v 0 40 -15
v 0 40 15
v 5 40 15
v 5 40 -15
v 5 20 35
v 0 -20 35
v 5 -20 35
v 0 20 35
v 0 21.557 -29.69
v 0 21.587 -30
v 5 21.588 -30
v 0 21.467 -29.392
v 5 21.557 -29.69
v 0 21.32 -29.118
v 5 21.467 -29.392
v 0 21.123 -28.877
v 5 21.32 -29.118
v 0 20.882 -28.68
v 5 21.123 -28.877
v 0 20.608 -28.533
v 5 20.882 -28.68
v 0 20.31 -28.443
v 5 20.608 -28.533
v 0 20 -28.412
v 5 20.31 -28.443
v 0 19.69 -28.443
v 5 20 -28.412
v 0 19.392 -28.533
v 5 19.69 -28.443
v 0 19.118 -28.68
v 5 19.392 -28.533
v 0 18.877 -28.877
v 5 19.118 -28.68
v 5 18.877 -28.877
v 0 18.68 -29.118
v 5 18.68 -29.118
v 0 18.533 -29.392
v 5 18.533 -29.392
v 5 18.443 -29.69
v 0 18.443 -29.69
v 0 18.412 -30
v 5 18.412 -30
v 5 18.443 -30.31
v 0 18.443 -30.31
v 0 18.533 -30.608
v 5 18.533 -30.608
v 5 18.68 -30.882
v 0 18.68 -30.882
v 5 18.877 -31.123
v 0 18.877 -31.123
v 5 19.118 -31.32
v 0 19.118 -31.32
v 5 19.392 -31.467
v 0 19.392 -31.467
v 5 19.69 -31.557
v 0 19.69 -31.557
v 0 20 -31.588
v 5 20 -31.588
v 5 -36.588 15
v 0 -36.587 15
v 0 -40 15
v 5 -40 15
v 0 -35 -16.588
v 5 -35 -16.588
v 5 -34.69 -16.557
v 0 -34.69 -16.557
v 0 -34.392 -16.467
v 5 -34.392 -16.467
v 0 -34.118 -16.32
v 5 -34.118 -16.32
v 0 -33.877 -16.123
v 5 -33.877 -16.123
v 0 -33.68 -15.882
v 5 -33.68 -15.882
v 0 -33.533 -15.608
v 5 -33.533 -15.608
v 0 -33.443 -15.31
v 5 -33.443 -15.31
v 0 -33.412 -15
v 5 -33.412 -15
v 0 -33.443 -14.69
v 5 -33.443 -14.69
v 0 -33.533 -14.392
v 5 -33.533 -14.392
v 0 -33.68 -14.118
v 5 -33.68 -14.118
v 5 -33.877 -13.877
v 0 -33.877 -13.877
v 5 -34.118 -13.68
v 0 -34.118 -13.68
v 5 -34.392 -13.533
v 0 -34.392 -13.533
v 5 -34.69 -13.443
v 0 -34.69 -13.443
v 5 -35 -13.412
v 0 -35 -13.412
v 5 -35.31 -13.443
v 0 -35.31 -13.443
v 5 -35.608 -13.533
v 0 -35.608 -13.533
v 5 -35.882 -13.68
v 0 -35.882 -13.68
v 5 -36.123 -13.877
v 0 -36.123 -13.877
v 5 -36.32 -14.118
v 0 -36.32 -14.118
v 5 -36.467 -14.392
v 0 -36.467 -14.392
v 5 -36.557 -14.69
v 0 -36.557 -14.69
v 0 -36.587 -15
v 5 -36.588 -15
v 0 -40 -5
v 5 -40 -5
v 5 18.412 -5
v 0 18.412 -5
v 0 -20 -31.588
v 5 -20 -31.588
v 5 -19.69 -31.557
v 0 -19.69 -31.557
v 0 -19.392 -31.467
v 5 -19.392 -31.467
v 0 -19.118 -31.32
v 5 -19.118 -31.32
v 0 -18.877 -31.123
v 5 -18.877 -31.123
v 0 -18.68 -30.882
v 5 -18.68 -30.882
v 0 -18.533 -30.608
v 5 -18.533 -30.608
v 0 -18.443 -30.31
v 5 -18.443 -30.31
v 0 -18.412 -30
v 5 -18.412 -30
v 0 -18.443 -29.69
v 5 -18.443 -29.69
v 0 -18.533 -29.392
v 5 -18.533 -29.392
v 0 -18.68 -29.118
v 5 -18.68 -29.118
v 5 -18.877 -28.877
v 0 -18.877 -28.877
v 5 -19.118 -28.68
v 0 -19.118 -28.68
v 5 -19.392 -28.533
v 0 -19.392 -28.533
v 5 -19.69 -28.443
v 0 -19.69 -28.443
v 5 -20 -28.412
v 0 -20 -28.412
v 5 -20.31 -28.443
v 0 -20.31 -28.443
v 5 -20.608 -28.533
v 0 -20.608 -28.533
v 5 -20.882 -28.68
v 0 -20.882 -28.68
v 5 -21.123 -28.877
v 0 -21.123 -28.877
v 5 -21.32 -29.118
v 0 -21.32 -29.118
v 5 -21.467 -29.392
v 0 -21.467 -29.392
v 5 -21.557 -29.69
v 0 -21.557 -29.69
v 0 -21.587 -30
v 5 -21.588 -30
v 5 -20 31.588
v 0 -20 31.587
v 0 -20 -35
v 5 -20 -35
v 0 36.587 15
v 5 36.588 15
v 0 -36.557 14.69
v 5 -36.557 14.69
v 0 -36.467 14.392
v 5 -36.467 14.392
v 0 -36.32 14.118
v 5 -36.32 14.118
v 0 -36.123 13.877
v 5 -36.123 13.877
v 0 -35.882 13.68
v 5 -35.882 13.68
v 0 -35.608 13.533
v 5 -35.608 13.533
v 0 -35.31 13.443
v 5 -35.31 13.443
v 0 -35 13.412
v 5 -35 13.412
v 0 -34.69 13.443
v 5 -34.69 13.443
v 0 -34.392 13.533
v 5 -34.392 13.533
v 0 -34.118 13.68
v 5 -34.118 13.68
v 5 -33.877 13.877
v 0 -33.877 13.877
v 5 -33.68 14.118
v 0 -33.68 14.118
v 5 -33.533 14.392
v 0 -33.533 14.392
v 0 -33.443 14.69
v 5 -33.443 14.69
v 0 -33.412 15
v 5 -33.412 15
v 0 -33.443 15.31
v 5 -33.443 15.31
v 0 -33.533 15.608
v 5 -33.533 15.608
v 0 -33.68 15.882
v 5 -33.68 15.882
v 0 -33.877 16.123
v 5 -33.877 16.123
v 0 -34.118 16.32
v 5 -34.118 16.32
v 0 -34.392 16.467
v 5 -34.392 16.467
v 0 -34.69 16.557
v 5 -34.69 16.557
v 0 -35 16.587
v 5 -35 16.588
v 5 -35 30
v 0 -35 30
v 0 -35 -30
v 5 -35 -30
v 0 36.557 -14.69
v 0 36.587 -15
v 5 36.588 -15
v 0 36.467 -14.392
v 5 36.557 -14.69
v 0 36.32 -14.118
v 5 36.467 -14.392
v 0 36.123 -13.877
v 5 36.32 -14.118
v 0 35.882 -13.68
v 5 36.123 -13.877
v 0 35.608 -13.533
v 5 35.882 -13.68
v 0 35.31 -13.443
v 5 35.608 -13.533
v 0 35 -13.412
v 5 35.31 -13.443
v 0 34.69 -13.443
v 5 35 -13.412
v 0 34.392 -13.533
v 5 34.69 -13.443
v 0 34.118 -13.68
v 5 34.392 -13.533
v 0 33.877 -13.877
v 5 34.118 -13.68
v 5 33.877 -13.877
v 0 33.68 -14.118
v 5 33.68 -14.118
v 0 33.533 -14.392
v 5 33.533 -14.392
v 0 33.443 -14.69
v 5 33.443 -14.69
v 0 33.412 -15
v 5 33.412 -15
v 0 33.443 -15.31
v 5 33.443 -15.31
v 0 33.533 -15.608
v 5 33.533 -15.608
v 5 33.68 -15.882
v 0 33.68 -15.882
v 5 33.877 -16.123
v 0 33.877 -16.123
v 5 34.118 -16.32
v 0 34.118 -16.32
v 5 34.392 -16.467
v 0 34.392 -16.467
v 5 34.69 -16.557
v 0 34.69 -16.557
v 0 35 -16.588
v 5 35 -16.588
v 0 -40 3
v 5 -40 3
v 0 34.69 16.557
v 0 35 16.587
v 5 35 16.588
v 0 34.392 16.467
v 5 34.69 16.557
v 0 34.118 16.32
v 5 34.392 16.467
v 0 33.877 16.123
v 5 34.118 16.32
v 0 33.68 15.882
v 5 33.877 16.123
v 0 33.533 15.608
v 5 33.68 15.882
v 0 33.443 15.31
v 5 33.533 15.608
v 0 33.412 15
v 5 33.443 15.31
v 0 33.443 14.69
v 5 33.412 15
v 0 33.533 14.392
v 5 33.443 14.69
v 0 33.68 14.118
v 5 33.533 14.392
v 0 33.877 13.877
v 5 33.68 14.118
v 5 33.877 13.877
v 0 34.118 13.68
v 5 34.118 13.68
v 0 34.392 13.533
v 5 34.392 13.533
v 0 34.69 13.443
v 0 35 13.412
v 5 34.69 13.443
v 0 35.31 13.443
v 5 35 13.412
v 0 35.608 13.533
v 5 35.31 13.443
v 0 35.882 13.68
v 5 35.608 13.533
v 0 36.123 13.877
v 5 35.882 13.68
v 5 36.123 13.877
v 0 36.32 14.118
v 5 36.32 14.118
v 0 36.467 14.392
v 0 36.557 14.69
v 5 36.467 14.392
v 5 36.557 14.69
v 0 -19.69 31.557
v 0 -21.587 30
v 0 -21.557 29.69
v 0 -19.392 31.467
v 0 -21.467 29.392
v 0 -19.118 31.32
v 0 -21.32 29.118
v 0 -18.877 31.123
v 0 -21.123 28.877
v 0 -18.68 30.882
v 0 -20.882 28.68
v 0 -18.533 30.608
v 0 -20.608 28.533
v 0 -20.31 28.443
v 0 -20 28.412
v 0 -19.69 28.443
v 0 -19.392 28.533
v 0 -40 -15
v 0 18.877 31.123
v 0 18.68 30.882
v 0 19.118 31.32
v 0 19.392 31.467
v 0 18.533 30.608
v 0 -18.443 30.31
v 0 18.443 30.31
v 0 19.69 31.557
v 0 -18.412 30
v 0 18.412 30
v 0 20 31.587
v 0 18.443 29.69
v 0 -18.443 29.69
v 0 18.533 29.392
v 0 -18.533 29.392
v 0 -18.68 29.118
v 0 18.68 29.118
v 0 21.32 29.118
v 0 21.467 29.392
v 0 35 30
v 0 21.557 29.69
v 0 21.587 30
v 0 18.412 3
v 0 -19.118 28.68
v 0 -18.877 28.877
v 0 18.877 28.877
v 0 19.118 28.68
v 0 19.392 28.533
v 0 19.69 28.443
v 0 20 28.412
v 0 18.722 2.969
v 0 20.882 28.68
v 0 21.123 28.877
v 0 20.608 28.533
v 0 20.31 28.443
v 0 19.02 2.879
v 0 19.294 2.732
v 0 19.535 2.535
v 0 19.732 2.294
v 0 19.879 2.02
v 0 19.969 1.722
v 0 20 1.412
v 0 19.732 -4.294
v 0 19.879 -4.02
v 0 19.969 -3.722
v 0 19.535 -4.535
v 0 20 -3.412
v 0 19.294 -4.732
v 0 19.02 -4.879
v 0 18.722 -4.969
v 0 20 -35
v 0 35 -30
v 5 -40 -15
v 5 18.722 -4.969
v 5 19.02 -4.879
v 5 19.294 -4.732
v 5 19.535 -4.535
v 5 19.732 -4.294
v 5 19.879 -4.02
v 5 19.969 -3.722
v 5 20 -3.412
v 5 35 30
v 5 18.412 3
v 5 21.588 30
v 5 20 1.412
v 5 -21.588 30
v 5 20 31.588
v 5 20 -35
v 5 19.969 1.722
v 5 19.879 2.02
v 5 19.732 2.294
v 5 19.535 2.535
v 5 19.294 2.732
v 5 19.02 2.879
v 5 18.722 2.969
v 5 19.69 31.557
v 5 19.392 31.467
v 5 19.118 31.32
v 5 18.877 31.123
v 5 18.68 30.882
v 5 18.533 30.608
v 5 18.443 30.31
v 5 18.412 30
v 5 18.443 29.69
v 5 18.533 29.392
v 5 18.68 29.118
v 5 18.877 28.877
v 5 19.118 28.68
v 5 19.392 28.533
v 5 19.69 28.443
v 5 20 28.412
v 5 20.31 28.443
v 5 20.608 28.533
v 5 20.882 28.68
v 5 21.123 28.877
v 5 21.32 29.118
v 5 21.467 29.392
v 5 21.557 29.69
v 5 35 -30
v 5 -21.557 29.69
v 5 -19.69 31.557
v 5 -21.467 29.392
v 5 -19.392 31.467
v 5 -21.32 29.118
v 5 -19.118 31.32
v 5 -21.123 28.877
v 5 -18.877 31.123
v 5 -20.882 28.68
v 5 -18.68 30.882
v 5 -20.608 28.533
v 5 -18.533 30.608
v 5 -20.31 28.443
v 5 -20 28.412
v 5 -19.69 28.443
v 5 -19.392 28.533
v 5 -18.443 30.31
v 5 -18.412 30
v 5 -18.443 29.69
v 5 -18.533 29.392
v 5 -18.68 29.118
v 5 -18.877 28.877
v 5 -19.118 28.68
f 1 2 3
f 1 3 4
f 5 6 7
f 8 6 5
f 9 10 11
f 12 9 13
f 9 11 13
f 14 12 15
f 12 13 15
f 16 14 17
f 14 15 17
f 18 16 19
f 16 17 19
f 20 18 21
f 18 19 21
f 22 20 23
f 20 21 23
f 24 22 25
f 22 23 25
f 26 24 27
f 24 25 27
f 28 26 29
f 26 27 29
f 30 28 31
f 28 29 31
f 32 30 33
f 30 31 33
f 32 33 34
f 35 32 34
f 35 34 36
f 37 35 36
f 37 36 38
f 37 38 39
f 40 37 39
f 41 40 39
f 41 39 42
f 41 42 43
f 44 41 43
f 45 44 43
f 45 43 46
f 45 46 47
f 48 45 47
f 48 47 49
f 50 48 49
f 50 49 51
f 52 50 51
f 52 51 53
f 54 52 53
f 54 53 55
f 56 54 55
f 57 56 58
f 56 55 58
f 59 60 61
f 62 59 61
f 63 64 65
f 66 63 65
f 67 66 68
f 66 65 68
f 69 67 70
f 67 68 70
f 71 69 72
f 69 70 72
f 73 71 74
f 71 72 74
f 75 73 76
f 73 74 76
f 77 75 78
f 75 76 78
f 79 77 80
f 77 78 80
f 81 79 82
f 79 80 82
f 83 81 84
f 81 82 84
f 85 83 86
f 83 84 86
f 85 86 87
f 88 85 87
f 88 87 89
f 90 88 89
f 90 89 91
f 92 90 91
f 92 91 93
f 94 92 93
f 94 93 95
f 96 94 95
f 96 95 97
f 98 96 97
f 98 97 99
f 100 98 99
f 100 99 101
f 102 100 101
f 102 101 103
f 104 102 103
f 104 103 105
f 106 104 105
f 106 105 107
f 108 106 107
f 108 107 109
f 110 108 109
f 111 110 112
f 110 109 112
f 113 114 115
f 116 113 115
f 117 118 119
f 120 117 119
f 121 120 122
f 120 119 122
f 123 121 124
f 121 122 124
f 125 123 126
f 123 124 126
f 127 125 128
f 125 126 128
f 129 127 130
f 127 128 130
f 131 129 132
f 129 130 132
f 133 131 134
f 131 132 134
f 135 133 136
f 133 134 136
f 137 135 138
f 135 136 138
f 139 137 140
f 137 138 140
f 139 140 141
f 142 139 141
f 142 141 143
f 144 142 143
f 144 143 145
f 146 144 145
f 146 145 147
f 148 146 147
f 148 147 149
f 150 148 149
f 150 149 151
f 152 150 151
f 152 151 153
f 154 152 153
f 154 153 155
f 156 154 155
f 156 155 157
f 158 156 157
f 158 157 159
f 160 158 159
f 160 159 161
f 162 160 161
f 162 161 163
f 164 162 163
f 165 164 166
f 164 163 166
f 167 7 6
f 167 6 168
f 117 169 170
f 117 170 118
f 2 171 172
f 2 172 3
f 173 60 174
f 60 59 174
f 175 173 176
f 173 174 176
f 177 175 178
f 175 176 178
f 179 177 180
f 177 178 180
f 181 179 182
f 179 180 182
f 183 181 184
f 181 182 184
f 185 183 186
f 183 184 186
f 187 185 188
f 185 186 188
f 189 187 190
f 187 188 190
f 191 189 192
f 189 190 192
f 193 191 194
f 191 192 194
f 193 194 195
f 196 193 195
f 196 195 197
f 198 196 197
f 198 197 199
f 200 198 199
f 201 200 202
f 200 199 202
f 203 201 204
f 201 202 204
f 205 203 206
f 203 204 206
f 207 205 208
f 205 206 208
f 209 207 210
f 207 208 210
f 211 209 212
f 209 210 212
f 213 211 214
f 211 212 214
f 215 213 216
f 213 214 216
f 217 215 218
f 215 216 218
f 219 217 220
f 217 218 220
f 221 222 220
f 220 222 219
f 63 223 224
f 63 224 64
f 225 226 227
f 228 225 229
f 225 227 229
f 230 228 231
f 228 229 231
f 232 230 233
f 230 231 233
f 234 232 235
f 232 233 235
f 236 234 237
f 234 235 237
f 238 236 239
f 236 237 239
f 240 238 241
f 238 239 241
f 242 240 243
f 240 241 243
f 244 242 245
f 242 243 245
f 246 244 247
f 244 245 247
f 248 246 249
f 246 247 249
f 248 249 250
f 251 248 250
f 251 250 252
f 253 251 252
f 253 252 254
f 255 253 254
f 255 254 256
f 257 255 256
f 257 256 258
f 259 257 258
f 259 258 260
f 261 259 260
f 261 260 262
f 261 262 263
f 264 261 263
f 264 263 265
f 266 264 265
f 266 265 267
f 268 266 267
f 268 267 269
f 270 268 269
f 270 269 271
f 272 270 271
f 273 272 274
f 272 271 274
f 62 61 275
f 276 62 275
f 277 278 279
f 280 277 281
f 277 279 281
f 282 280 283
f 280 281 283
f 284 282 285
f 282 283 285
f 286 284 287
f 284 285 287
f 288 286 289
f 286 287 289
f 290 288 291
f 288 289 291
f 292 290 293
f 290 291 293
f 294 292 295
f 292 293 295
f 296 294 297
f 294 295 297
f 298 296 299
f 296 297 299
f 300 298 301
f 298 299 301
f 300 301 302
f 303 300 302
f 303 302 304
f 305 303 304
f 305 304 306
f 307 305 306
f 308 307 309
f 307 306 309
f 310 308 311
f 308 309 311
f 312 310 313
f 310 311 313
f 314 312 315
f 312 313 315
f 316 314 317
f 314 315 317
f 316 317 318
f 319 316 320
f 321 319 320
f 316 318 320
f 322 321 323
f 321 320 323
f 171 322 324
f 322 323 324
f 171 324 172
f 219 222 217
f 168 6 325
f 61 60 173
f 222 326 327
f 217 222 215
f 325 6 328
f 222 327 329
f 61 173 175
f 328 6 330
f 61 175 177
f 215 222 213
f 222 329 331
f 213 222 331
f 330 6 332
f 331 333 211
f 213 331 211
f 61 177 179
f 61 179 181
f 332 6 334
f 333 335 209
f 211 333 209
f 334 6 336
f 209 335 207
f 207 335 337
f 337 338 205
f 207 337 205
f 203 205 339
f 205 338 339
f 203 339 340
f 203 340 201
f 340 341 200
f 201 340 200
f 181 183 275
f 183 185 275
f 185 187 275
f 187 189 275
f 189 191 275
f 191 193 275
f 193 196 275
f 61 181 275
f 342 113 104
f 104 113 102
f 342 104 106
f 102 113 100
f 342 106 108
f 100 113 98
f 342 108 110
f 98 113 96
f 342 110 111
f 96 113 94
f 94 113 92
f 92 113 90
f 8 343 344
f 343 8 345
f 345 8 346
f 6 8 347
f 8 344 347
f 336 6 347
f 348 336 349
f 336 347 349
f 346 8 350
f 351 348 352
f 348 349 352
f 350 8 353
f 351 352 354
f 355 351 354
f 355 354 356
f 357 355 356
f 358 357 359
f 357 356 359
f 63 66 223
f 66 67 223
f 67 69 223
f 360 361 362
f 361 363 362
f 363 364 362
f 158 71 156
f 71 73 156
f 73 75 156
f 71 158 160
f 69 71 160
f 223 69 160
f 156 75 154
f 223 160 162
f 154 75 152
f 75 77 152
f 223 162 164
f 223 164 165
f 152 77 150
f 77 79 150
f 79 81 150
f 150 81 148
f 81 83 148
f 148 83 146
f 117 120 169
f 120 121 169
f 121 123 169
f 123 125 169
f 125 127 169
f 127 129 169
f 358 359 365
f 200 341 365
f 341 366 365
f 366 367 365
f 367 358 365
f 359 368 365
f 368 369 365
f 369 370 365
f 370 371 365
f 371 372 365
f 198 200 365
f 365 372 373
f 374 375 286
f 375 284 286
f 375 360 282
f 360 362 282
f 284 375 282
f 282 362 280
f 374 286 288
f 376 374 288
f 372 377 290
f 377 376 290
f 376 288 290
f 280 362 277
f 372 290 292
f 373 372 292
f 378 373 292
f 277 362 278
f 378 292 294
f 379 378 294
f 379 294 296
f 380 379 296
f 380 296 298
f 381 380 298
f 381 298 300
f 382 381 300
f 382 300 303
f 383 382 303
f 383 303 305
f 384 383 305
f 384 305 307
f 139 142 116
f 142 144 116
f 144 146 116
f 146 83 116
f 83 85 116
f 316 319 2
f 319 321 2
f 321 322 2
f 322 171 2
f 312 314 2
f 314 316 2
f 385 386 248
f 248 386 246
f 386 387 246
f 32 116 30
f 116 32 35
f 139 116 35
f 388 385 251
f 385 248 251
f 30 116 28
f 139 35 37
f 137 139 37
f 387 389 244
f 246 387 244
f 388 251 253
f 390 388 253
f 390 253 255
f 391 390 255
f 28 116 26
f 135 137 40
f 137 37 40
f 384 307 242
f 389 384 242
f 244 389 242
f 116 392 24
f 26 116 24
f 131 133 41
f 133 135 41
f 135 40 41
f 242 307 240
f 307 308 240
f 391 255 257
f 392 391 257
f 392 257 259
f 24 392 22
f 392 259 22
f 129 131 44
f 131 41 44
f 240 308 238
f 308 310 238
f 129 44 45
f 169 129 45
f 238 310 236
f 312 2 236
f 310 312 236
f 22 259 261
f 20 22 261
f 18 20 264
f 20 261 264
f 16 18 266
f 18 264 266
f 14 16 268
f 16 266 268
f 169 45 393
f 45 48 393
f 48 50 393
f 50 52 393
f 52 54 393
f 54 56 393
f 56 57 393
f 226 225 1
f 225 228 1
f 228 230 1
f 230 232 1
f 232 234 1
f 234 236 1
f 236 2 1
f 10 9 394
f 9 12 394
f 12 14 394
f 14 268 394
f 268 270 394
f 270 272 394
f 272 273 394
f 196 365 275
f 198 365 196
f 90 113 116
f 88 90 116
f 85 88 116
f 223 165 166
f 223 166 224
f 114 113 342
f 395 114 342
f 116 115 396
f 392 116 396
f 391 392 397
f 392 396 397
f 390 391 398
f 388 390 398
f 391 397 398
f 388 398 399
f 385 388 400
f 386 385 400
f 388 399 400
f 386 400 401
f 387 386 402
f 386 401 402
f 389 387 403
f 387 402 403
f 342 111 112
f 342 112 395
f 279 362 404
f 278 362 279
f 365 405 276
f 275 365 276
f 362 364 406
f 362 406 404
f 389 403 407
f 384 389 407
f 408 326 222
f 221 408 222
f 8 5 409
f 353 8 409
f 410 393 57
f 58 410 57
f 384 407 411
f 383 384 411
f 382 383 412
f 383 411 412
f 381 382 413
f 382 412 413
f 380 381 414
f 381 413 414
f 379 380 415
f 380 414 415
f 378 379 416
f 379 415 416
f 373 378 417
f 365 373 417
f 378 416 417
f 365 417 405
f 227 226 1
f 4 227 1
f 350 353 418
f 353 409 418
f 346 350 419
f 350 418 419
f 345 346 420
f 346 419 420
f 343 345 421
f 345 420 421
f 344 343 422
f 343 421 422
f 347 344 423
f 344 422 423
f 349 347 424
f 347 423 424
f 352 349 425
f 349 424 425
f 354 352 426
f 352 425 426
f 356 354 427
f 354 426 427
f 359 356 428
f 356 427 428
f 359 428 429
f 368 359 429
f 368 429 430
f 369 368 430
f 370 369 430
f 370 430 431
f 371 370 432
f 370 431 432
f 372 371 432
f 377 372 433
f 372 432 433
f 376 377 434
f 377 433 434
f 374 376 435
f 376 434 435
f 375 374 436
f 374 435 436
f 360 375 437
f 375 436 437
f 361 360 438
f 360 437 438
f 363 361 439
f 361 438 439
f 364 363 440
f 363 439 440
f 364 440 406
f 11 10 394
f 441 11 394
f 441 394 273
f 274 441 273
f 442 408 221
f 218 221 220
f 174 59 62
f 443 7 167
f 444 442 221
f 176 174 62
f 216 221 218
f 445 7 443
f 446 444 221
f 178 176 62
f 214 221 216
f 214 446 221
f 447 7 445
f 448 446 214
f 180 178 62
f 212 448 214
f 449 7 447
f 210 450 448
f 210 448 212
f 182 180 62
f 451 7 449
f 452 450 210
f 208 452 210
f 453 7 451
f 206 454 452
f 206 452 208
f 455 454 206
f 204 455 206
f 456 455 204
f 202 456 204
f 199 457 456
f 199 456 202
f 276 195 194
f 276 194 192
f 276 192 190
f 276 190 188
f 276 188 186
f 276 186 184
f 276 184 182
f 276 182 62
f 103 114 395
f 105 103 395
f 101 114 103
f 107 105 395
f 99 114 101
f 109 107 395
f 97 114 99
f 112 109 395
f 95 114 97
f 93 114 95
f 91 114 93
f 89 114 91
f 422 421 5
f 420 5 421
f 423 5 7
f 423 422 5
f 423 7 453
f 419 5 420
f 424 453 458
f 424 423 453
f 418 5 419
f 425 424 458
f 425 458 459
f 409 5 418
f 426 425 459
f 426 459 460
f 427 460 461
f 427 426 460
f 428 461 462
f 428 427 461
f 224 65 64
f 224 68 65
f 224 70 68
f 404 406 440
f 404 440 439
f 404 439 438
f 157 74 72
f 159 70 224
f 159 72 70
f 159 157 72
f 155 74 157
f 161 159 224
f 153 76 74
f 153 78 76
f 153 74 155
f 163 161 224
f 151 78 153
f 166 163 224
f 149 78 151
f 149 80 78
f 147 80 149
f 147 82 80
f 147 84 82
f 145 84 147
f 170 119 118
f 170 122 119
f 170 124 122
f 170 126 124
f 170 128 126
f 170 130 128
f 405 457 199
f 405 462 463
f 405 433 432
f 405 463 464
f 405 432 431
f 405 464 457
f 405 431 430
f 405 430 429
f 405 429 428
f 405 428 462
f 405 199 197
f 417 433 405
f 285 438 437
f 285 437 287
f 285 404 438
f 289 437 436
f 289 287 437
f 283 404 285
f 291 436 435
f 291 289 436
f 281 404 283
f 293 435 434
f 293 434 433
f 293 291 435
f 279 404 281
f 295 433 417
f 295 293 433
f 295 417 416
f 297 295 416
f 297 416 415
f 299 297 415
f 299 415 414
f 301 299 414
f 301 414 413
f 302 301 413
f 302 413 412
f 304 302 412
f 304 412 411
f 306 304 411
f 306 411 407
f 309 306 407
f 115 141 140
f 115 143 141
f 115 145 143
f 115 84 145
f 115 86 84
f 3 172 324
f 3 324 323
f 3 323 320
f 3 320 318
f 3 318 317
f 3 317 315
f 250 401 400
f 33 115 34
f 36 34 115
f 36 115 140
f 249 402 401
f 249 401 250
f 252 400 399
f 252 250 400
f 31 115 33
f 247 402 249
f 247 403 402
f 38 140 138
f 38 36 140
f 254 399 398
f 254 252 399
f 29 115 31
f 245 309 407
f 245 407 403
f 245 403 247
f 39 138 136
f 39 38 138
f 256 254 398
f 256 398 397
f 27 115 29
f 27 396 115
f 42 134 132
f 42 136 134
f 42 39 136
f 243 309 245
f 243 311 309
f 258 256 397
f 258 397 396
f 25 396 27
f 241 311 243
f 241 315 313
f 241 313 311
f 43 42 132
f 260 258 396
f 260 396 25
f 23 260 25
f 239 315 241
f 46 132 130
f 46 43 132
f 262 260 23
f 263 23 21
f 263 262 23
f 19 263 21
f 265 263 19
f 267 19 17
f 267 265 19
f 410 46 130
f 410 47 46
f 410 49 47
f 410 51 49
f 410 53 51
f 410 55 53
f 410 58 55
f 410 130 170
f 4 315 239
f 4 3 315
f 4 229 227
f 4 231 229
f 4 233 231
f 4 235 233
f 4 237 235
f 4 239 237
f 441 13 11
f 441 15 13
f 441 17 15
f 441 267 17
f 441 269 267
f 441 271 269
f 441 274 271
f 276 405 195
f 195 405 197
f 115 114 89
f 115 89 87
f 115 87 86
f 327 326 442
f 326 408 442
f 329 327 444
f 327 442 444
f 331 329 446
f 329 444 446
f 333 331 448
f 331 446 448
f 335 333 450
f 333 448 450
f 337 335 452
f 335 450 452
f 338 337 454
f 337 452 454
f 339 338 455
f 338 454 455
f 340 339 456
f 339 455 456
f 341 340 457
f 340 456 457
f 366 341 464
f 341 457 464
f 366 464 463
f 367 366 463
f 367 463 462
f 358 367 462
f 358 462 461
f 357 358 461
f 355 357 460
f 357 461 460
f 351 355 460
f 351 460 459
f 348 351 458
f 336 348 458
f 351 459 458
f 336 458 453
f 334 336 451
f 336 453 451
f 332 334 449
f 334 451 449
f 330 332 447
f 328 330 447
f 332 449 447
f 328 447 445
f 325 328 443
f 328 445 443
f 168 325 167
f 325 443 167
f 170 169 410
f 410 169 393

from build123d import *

# Parameters (mm, degrees)
SKETCH1_W                                = 70
SKETCH1_H                                = 80
BOSS_EXTRUDE1_DEPTH                      = 5
CUT_EXTRUDE1_START                       = -6
CUT_EXTRUDE1_DEPTH                       = 7
MIRROR1_START                            = -6
MIRROR1_AT_THE_SECOND_PLANE_COPY_1_DEPTH = 7
CUT_EXTRUDE2_DEPTH                       = 1
CUT_EXTRUDE2_DEPTH_BACK                  = 6
SKETCH5_R                                = 1.5875
CUT_EXTRUDE3_DEPTH                       = 6


with BuildPart() as part:
    # Sketch1 → Boss-Extrude1 (new body)
    with BuildSketch(Plane(origin=(0, 0, 0), x_dir=(0, 0, -1), z_dir=(1, 0, 0))):
        Rectangle(SKETCH1_W, SKETCH1_H)
    extrude(amount=BOSS_EXTRUDE1_DEPTH)

    # Sketch3 → Cut-Extrude1 (cut)
    with BuildSketch(Plane(origin=(5, 0, 0), x_dir=(0, 0, -1), z_dir=(1, 0, 0)).offset(CUT_EXTRUDE1_START)):
        Polygon((-35, 20), (-30, 20), (-30, 35), (-15, 35), (-15, 40), (-35, 40), align=None)
    cut_extrude1 = extrude(amount=CUT_EXTRUDE1_DEPTH, mode=Mode.SUBTRACT)

    # Mirror1: Cut-Extrude1 across plane
    add(cut_extrude1.mirror(Plane.XY), mode=Mode.SUBTRACT)

    # Mirror1 at the second plane: Cut-Extrude1 across plane
    add(cut_extrude1.mirror(Plane.ZX), mode=Mode.SUBTRACT)

    # Mirror1 at the second plane copy 1 sketc → Mirror1 at the second plane copy 1 (cut)
    with BuildSketch(Plane(origin=(5, 0, 0), x_dir=(0, 0, 1), z_dir=(1, 0, 0)).offset(MIRROR1_START)):
        Polygon((-35, 20), (-30, 20), (-30, 35), (-15, 35), (-15, 40), (-35, 40), align=None)
    extrude(amount=MIRROR1_AT_THE_SECOND_PLANE_COPY_1_DEPTH, mode=Mode.SUBTRACT)

    # Sketch4 → Cut-Extrude2 (cut, two sides)
    with BuildSketch(Plane(origin=(5, 0, 0), x_dir=(0, 0, -1), z_dir=(1, 0, 0))) as cut_extrude2_sk:
        with BuildLine():
            Line((-3, -40), (5, -40))
            Line((5, -40), (5, 18.4125))
            ThreePointArc((5, 18.4125), (4.535032015, 19.535032015), (3.4125, 20))
            Line((3.4125, 20), (-1.4125, 20))
            ThreePointArc((-1.4125, 20), (-2.535032015, 19.535032015), (-3, 18.4125))
            Line((-3, 18.4125), (-3, -40))
        make_face()
    extrude(amount=CUT_EXTRUDE2_DEPTH, mode=Mode.SUBTRACT)
    extrude(cut_extrude2_sk.sketch, amount=-CUT_EXTRUDE2_DEPTH_BACK, mode=Mode.SUBTRACT)

    # Sketch5 → Cut-Extrude3 (cut, through all)
    with BuildSketch(Plane(origin=(5, 0, 0), x_dir=(0, 0, -1), z_dir=(1, 0, 0))):
        with Locations((-15, 35)):
            Circle(SKETCH5_R)
        with Locations((15, 35)):
            Circle(SKETCH5_R)
        with Locations((30, 20)):
            Circle(SKETCH5_R)
        with Locations((30, -20)):
            Circle(SKETCH5_R)
        with Locations((15, -35)):
            Circle(SKETCH5_R)
        with Locations((-15, -35)):
            Circle(SKETCH5_R)
        with Locations((-30, -20)):
            Circle(SKETCH5_R)
        with Locations((-30, 20)):
            Circle(SKETCH5_R)
    extrude(amount=-CUT_EXTRUDE3_DEPTH, mode=Mode.SUBTRACT)


solid = part.part
